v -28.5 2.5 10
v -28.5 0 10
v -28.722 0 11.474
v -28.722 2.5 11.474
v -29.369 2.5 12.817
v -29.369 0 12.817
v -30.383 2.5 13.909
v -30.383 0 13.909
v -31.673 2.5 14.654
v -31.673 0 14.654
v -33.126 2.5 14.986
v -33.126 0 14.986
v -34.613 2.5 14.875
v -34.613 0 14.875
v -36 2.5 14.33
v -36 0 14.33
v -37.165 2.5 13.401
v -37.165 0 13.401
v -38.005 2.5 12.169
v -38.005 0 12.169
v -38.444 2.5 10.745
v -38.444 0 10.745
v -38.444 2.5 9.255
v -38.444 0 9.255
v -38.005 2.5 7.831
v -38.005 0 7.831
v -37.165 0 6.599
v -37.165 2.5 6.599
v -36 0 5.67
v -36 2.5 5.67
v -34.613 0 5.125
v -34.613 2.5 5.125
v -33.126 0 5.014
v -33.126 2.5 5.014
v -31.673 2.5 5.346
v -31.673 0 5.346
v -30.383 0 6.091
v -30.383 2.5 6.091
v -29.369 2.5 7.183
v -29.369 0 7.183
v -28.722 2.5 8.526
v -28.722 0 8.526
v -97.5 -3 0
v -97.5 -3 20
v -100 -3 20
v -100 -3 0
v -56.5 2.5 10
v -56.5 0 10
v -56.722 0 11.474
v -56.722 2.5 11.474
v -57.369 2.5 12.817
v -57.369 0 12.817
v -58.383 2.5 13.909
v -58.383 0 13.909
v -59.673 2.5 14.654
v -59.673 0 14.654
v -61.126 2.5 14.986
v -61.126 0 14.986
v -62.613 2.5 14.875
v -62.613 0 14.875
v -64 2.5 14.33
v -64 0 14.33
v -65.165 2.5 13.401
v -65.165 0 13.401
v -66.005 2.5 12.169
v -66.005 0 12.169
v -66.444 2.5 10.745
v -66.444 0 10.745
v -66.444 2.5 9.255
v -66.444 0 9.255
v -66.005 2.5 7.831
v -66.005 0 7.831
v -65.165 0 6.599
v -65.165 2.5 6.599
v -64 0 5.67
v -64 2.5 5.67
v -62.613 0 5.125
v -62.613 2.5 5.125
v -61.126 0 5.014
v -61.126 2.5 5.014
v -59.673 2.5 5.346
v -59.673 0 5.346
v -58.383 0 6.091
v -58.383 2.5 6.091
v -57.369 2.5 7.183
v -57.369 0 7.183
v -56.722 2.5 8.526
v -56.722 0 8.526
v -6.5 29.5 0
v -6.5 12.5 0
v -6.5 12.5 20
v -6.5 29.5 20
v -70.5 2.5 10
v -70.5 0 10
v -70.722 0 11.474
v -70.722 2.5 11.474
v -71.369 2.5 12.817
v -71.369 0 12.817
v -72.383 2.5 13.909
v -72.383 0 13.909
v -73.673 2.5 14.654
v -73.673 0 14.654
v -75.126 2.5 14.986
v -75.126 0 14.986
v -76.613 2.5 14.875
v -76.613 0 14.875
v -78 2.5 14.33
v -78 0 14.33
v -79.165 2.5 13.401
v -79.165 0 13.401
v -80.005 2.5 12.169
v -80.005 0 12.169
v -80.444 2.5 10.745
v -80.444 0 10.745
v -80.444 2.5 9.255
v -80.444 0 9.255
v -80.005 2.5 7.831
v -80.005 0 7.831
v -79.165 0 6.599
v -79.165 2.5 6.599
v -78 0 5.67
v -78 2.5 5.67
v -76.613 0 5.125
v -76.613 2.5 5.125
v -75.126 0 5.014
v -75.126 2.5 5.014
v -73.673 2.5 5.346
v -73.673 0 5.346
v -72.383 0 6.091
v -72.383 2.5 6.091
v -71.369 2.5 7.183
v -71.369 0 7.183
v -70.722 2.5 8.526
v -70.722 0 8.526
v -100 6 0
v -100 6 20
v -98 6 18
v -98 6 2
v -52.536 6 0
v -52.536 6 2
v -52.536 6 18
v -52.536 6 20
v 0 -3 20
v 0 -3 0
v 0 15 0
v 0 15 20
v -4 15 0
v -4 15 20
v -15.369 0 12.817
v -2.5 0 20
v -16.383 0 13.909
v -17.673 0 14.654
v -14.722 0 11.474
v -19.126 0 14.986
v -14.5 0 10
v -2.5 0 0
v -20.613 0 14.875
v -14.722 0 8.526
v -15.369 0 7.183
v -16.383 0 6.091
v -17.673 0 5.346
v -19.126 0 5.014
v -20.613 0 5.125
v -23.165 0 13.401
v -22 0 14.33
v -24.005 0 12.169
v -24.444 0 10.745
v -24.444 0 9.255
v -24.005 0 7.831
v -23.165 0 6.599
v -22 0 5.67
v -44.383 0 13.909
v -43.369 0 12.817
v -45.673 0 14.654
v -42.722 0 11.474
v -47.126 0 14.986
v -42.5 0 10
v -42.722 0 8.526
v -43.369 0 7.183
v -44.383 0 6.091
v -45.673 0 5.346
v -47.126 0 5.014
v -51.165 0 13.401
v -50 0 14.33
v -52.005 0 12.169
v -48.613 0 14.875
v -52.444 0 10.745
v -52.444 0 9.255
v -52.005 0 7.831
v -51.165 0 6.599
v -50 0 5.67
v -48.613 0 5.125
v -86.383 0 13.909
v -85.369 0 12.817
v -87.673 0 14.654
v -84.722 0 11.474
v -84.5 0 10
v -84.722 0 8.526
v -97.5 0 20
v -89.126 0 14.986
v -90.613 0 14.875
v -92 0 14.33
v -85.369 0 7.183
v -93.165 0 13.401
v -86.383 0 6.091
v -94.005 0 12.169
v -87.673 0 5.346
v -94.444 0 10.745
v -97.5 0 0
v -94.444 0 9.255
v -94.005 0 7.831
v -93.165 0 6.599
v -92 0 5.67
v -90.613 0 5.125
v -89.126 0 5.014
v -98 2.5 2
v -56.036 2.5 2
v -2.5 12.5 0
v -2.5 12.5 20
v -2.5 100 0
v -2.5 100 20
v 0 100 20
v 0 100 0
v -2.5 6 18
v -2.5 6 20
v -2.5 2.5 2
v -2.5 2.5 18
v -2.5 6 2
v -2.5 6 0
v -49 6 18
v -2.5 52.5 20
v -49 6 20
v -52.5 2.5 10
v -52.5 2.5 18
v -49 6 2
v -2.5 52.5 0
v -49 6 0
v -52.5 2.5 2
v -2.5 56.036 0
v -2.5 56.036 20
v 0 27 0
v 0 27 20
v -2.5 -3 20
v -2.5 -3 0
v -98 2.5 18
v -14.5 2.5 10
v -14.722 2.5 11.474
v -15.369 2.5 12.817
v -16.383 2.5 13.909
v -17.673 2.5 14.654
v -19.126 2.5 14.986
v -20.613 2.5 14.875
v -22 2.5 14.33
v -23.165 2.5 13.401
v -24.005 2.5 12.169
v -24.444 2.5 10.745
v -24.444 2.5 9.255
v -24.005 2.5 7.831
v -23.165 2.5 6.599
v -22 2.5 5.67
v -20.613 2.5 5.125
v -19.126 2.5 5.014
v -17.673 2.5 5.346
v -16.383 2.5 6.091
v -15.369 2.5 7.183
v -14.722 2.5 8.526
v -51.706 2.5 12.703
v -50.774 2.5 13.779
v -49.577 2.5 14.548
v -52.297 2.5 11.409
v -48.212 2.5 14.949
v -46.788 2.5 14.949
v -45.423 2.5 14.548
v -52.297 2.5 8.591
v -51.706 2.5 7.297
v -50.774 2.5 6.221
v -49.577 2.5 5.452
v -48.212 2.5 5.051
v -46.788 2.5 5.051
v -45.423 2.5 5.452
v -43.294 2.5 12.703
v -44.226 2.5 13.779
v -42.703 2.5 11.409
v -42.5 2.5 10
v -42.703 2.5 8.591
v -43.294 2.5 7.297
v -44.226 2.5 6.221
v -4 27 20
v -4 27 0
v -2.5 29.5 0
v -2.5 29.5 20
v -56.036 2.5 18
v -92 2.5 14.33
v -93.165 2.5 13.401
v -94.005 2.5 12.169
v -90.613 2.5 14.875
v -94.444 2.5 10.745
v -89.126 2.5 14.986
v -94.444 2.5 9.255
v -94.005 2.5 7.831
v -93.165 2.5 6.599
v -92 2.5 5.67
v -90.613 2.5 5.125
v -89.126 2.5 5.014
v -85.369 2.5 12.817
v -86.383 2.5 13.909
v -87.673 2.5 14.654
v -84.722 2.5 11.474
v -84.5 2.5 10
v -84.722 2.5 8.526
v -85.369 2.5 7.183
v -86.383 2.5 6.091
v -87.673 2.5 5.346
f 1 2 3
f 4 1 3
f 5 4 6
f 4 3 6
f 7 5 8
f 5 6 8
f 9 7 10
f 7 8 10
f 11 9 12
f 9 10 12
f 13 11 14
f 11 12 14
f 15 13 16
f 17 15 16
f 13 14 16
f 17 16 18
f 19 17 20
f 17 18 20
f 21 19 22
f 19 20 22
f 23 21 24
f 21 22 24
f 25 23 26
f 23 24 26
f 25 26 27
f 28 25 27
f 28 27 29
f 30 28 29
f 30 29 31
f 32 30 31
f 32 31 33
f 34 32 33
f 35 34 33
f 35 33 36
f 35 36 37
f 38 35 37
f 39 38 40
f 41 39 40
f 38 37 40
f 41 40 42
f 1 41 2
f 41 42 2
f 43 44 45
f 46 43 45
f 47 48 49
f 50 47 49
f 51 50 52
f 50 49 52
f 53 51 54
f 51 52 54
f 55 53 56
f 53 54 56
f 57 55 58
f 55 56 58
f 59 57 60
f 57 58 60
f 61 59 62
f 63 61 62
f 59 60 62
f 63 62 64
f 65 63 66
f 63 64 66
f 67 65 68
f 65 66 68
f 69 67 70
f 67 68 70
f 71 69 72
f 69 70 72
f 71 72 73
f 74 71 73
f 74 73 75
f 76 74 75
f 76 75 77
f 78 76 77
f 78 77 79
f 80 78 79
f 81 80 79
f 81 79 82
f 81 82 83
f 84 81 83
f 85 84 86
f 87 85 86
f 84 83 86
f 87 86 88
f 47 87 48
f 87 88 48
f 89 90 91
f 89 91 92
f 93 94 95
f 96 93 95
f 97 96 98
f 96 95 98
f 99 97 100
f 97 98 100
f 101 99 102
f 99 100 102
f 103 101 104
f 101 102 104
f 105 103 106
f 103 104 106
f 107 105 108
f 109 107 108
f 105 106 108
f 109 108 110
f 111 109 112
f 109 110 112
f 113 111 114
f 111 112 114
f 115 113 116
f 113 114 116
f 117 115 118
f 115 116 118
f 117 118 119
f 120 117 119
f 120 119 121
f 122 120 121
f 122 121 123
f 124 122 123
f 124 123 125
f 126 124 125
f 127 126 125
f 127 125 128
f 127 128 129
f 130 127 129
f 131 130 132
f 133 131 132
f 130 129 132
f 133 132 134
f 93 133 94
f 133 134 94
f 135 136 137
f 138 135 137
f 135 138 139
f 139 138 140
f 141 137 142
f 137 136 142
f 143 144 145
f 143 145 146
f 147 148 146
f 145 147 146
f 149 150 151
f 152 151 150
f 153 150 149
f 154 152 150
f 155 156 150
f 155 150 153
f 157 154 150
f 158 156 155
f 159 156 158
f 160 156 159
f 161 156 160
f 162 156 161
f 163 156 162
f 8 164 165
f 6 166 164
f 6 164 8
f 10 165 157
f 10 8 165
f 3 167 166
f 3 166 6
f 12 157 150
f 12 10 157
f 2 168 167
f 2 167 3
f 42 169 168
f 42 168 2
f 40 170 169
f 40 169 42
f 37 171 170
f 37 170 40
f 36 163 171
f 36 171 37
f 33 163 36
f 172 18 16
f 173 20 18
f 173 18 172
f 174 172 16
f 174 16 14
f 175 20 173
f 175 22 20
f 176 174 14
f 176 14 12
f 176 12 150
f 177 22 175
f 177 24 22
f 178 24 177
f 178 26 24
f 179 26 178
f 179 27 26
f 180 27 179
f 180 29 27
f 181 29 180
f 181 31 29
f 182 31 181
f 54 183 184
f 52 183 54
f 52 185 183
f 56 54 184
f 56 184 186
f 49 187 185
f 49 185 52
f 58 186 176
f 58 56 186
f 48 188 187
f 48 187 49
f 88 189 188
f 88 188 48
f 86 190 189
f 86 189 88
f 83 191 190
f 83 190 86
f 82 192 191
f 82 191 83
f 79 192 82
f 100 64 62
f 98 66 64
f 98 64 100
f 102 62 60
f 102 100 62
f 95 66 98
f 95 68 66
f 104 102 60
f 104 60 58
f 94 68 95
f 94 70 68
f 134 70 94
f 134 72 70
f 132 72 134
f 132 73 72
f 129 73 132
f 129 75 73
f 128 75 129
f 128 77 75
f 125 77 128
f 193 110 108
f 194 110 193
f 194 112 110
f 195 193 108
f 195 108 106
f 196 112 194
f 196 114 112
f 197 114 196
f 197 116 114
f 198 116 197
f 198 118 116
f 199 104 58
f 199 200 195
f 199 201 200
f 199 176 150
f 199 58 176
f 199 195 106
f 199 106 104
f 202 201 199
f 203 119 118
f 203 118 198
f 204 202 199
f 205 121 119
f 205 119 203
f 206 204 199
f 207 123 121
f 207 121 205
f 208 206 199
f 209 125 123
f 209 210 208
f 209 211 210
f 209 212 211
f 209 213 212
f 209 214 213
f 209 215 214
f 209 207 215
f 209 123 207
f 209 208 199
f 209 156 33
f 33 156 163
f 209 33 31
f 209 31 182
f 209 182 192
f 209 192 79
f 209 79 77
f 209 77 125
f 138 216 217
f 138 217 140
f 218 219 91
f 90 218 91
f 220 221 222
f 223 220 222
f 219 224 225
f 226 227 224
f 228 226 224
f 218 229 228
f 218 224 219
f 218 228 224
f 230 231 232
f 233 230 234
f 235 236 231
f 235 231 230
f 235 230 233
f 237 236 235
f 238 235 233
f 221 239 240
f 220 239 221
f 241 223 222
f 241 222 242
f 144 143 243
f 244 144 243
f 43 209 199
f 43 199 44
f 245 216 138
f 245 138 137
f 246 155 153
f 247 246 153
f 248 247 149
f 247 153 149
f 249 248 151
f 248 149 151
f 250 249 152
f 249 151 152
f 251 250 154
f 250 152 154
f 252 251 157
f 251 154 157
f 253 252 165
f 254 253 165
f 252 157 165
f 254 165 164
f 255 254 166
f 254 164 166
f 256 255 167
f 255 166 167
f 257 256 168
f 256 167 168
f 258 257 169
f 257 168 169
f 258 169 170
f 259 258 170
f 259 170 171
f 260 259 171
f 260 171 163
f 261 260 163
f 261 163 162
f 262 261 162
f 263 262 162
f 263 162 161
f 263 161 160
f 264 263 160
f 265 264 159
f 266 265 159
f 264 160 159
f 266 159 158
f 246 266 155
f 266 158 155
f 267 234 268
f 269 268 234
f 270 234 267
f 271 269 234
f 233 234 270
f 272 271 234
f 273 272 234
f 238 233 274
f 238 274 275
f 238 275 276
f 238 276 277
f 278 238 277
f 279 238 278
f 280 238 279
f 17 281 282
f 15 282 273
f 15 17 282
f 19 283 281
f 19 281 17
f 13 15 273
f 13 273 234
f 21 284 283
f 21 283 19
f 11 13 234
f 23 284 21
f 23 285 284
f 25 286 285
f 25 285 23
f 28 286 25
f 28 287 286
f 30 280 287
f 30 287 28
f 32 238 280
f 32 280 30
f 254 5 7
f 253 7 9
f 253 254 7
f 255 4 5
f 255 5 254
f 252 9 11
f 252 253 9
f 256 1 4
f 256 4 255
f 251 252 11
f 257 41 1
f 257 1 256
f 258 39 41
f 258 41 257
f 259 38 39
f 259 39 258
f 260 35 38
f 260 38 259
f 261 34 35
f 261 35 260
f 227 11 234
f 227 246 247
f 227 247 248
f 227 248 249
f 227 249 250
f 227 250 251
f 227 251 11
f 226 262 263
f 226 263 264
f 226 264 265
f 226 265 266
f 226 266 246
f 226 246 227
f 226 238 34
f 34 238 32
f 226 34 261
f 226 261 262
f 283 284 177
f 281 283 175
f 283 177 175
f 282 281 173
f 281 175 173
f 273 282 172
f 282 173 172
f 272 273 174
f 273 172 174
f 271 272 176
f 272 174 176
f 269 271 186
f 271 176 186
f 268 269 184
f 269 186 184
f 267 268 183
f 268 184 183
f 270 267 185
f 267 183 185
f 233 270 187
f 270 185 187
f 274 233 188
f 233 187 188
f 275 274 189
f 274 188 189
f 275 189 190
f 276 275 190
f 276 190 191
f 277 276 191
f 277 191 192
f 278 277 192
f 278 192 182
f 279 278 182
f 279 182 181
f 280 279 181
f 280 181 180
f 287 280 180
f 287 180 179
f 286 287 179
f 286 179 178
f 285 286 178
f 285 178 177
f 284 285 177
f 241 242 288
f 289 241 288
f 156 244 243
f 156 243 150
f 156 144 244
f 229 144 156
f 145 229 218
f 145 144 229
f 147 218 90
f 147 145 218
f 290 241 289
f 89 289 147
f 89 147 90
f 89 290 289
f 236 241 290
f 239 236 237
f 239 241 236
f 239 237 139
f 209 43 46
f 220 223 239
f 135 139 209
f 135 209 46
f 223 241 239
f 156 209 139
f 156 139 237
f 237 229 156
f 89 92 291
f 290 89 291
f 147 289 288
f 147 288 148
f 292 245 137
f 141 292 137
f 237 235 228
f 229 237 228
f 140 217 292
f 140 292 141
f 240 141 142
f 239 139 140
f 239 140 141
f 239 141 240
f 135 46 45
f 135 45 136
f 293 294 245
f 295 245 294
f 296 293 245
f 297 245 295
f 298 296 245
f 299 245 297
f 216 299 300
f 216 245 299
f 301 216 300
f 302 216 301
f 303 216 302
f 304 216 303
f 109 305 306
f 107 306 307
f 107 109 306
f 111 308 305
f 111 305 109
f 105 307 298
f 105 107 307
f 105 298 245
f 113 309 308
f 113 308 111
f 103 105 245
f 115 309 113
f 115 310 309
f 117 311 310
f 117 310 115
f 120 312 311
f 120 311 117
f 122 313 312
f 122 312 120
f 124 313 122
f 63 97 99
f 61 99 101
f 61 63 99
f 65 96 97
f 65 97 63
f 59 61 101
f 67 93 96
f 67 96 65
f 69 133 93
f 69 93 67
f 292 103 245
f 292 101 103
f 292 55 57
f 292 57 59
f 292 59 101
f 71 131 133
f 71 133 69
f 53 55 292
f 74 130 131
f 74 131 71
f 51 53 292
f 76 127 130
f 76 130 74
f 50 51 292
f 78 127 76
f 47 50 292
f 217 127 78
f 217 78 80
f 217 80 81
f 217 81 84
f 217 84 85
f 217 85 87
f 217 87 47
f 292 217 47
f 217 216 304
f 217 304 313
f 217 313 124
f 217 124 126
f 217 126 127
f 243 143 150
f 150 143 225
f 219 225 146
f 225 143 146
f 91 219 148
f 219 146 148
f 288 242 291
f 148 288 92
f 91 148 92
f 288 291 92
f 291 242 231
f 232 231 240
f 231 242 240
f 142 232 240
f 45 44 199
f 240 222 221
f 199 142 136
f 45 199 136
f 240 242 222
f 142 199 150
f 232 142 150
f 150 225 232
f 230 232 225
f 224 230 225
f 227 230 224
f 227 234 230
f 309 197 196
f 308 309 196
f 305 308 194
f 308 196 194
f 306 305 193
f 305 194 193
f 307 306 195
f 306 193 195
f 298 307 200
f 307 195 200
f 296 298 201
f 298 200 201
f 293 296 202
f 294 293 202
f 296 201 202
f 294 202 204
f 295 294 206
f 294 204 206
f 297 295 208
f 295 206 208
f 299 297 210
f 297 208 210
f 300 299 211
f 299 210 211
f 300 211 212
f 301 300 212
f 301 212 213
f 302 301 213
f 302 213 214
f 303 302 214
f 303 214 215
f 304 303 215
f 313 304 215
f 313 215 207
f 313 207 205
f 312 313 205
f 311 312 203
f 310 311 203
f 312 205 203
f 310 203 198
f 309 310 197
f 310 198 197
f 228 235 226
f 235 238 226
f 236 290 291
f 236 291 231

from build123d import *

# Parameters (mm, degrees)
PAD_DEPTH           = 20
SKETCH002_W         = 100
SKETCH002_H         = 20
SKETCH002_W_2       = 96
SKETCH002_H_2       = 16
PAD001_DEPTH        = 6
SKETCH001_R         = 5
POCKET_DEPTH        = 2.5
LINEARPATTERN_COUNT = 6
LINEARPATTERN_PITCH = 14


with BuildPart() as part:
    # Sketch → Pad (new body)
    with BuildSketch(Plane.XY):
        Polygon((0, 100), (0, 27), (-4, 27), (-4, 15), (0, 15), (0, -3), (-2.5, -3), (-2.5, 0), (-97.5, 0), (-97.5, -3), (-100, -3), (-100, 2.5), (-56.035534, 2.5), (-2.5, 56.035534), (-2.5, 100), align=None)
        Polygon((-52.5, 2.5), (-2.5, 2.5), (-2.5, 12.5), (-6.5, 12.5), (-6.5, 29.5), (-2.5, 29.5), (-2.5, 52.5), align=None, mode=Mode.SUBTRACT)
    extrude(amount=PAD_DEPTH)

    # Sketch002 → Pad001 (join)
    with BuildSketch(Plane.XZ):
        with Locations((-50, 10)):
            Rectangle(SKETCH002_W, SKETCH002_H)
        with Locations((-50, 10)):
            Rectangle(SKETCH002_W_2, SKETCH002_H_2, mode=Mode.SUBTRACT)
    extrude(amount=-PAD001_DEPTH)

    # Sketch001 → Pocket (cut)
    with BuildSketch(Plane.XZ):
        with Locations((-89.5, 10)):
            Circle(SKETCH001_R)
    pocket = extrude(amount=-POCKET_DEPTH, mode=Mode.SUBTRACT)

    # LinearPattern: Pocket ×6
    with Locations(*[(i * LINEARPATTERN_PITCH, 0, 0) for i in range(1, LINEARPATTERN_COUNT)]):
        add(pocket, mode=Mode.SUBTRACT)


solid = part.part
